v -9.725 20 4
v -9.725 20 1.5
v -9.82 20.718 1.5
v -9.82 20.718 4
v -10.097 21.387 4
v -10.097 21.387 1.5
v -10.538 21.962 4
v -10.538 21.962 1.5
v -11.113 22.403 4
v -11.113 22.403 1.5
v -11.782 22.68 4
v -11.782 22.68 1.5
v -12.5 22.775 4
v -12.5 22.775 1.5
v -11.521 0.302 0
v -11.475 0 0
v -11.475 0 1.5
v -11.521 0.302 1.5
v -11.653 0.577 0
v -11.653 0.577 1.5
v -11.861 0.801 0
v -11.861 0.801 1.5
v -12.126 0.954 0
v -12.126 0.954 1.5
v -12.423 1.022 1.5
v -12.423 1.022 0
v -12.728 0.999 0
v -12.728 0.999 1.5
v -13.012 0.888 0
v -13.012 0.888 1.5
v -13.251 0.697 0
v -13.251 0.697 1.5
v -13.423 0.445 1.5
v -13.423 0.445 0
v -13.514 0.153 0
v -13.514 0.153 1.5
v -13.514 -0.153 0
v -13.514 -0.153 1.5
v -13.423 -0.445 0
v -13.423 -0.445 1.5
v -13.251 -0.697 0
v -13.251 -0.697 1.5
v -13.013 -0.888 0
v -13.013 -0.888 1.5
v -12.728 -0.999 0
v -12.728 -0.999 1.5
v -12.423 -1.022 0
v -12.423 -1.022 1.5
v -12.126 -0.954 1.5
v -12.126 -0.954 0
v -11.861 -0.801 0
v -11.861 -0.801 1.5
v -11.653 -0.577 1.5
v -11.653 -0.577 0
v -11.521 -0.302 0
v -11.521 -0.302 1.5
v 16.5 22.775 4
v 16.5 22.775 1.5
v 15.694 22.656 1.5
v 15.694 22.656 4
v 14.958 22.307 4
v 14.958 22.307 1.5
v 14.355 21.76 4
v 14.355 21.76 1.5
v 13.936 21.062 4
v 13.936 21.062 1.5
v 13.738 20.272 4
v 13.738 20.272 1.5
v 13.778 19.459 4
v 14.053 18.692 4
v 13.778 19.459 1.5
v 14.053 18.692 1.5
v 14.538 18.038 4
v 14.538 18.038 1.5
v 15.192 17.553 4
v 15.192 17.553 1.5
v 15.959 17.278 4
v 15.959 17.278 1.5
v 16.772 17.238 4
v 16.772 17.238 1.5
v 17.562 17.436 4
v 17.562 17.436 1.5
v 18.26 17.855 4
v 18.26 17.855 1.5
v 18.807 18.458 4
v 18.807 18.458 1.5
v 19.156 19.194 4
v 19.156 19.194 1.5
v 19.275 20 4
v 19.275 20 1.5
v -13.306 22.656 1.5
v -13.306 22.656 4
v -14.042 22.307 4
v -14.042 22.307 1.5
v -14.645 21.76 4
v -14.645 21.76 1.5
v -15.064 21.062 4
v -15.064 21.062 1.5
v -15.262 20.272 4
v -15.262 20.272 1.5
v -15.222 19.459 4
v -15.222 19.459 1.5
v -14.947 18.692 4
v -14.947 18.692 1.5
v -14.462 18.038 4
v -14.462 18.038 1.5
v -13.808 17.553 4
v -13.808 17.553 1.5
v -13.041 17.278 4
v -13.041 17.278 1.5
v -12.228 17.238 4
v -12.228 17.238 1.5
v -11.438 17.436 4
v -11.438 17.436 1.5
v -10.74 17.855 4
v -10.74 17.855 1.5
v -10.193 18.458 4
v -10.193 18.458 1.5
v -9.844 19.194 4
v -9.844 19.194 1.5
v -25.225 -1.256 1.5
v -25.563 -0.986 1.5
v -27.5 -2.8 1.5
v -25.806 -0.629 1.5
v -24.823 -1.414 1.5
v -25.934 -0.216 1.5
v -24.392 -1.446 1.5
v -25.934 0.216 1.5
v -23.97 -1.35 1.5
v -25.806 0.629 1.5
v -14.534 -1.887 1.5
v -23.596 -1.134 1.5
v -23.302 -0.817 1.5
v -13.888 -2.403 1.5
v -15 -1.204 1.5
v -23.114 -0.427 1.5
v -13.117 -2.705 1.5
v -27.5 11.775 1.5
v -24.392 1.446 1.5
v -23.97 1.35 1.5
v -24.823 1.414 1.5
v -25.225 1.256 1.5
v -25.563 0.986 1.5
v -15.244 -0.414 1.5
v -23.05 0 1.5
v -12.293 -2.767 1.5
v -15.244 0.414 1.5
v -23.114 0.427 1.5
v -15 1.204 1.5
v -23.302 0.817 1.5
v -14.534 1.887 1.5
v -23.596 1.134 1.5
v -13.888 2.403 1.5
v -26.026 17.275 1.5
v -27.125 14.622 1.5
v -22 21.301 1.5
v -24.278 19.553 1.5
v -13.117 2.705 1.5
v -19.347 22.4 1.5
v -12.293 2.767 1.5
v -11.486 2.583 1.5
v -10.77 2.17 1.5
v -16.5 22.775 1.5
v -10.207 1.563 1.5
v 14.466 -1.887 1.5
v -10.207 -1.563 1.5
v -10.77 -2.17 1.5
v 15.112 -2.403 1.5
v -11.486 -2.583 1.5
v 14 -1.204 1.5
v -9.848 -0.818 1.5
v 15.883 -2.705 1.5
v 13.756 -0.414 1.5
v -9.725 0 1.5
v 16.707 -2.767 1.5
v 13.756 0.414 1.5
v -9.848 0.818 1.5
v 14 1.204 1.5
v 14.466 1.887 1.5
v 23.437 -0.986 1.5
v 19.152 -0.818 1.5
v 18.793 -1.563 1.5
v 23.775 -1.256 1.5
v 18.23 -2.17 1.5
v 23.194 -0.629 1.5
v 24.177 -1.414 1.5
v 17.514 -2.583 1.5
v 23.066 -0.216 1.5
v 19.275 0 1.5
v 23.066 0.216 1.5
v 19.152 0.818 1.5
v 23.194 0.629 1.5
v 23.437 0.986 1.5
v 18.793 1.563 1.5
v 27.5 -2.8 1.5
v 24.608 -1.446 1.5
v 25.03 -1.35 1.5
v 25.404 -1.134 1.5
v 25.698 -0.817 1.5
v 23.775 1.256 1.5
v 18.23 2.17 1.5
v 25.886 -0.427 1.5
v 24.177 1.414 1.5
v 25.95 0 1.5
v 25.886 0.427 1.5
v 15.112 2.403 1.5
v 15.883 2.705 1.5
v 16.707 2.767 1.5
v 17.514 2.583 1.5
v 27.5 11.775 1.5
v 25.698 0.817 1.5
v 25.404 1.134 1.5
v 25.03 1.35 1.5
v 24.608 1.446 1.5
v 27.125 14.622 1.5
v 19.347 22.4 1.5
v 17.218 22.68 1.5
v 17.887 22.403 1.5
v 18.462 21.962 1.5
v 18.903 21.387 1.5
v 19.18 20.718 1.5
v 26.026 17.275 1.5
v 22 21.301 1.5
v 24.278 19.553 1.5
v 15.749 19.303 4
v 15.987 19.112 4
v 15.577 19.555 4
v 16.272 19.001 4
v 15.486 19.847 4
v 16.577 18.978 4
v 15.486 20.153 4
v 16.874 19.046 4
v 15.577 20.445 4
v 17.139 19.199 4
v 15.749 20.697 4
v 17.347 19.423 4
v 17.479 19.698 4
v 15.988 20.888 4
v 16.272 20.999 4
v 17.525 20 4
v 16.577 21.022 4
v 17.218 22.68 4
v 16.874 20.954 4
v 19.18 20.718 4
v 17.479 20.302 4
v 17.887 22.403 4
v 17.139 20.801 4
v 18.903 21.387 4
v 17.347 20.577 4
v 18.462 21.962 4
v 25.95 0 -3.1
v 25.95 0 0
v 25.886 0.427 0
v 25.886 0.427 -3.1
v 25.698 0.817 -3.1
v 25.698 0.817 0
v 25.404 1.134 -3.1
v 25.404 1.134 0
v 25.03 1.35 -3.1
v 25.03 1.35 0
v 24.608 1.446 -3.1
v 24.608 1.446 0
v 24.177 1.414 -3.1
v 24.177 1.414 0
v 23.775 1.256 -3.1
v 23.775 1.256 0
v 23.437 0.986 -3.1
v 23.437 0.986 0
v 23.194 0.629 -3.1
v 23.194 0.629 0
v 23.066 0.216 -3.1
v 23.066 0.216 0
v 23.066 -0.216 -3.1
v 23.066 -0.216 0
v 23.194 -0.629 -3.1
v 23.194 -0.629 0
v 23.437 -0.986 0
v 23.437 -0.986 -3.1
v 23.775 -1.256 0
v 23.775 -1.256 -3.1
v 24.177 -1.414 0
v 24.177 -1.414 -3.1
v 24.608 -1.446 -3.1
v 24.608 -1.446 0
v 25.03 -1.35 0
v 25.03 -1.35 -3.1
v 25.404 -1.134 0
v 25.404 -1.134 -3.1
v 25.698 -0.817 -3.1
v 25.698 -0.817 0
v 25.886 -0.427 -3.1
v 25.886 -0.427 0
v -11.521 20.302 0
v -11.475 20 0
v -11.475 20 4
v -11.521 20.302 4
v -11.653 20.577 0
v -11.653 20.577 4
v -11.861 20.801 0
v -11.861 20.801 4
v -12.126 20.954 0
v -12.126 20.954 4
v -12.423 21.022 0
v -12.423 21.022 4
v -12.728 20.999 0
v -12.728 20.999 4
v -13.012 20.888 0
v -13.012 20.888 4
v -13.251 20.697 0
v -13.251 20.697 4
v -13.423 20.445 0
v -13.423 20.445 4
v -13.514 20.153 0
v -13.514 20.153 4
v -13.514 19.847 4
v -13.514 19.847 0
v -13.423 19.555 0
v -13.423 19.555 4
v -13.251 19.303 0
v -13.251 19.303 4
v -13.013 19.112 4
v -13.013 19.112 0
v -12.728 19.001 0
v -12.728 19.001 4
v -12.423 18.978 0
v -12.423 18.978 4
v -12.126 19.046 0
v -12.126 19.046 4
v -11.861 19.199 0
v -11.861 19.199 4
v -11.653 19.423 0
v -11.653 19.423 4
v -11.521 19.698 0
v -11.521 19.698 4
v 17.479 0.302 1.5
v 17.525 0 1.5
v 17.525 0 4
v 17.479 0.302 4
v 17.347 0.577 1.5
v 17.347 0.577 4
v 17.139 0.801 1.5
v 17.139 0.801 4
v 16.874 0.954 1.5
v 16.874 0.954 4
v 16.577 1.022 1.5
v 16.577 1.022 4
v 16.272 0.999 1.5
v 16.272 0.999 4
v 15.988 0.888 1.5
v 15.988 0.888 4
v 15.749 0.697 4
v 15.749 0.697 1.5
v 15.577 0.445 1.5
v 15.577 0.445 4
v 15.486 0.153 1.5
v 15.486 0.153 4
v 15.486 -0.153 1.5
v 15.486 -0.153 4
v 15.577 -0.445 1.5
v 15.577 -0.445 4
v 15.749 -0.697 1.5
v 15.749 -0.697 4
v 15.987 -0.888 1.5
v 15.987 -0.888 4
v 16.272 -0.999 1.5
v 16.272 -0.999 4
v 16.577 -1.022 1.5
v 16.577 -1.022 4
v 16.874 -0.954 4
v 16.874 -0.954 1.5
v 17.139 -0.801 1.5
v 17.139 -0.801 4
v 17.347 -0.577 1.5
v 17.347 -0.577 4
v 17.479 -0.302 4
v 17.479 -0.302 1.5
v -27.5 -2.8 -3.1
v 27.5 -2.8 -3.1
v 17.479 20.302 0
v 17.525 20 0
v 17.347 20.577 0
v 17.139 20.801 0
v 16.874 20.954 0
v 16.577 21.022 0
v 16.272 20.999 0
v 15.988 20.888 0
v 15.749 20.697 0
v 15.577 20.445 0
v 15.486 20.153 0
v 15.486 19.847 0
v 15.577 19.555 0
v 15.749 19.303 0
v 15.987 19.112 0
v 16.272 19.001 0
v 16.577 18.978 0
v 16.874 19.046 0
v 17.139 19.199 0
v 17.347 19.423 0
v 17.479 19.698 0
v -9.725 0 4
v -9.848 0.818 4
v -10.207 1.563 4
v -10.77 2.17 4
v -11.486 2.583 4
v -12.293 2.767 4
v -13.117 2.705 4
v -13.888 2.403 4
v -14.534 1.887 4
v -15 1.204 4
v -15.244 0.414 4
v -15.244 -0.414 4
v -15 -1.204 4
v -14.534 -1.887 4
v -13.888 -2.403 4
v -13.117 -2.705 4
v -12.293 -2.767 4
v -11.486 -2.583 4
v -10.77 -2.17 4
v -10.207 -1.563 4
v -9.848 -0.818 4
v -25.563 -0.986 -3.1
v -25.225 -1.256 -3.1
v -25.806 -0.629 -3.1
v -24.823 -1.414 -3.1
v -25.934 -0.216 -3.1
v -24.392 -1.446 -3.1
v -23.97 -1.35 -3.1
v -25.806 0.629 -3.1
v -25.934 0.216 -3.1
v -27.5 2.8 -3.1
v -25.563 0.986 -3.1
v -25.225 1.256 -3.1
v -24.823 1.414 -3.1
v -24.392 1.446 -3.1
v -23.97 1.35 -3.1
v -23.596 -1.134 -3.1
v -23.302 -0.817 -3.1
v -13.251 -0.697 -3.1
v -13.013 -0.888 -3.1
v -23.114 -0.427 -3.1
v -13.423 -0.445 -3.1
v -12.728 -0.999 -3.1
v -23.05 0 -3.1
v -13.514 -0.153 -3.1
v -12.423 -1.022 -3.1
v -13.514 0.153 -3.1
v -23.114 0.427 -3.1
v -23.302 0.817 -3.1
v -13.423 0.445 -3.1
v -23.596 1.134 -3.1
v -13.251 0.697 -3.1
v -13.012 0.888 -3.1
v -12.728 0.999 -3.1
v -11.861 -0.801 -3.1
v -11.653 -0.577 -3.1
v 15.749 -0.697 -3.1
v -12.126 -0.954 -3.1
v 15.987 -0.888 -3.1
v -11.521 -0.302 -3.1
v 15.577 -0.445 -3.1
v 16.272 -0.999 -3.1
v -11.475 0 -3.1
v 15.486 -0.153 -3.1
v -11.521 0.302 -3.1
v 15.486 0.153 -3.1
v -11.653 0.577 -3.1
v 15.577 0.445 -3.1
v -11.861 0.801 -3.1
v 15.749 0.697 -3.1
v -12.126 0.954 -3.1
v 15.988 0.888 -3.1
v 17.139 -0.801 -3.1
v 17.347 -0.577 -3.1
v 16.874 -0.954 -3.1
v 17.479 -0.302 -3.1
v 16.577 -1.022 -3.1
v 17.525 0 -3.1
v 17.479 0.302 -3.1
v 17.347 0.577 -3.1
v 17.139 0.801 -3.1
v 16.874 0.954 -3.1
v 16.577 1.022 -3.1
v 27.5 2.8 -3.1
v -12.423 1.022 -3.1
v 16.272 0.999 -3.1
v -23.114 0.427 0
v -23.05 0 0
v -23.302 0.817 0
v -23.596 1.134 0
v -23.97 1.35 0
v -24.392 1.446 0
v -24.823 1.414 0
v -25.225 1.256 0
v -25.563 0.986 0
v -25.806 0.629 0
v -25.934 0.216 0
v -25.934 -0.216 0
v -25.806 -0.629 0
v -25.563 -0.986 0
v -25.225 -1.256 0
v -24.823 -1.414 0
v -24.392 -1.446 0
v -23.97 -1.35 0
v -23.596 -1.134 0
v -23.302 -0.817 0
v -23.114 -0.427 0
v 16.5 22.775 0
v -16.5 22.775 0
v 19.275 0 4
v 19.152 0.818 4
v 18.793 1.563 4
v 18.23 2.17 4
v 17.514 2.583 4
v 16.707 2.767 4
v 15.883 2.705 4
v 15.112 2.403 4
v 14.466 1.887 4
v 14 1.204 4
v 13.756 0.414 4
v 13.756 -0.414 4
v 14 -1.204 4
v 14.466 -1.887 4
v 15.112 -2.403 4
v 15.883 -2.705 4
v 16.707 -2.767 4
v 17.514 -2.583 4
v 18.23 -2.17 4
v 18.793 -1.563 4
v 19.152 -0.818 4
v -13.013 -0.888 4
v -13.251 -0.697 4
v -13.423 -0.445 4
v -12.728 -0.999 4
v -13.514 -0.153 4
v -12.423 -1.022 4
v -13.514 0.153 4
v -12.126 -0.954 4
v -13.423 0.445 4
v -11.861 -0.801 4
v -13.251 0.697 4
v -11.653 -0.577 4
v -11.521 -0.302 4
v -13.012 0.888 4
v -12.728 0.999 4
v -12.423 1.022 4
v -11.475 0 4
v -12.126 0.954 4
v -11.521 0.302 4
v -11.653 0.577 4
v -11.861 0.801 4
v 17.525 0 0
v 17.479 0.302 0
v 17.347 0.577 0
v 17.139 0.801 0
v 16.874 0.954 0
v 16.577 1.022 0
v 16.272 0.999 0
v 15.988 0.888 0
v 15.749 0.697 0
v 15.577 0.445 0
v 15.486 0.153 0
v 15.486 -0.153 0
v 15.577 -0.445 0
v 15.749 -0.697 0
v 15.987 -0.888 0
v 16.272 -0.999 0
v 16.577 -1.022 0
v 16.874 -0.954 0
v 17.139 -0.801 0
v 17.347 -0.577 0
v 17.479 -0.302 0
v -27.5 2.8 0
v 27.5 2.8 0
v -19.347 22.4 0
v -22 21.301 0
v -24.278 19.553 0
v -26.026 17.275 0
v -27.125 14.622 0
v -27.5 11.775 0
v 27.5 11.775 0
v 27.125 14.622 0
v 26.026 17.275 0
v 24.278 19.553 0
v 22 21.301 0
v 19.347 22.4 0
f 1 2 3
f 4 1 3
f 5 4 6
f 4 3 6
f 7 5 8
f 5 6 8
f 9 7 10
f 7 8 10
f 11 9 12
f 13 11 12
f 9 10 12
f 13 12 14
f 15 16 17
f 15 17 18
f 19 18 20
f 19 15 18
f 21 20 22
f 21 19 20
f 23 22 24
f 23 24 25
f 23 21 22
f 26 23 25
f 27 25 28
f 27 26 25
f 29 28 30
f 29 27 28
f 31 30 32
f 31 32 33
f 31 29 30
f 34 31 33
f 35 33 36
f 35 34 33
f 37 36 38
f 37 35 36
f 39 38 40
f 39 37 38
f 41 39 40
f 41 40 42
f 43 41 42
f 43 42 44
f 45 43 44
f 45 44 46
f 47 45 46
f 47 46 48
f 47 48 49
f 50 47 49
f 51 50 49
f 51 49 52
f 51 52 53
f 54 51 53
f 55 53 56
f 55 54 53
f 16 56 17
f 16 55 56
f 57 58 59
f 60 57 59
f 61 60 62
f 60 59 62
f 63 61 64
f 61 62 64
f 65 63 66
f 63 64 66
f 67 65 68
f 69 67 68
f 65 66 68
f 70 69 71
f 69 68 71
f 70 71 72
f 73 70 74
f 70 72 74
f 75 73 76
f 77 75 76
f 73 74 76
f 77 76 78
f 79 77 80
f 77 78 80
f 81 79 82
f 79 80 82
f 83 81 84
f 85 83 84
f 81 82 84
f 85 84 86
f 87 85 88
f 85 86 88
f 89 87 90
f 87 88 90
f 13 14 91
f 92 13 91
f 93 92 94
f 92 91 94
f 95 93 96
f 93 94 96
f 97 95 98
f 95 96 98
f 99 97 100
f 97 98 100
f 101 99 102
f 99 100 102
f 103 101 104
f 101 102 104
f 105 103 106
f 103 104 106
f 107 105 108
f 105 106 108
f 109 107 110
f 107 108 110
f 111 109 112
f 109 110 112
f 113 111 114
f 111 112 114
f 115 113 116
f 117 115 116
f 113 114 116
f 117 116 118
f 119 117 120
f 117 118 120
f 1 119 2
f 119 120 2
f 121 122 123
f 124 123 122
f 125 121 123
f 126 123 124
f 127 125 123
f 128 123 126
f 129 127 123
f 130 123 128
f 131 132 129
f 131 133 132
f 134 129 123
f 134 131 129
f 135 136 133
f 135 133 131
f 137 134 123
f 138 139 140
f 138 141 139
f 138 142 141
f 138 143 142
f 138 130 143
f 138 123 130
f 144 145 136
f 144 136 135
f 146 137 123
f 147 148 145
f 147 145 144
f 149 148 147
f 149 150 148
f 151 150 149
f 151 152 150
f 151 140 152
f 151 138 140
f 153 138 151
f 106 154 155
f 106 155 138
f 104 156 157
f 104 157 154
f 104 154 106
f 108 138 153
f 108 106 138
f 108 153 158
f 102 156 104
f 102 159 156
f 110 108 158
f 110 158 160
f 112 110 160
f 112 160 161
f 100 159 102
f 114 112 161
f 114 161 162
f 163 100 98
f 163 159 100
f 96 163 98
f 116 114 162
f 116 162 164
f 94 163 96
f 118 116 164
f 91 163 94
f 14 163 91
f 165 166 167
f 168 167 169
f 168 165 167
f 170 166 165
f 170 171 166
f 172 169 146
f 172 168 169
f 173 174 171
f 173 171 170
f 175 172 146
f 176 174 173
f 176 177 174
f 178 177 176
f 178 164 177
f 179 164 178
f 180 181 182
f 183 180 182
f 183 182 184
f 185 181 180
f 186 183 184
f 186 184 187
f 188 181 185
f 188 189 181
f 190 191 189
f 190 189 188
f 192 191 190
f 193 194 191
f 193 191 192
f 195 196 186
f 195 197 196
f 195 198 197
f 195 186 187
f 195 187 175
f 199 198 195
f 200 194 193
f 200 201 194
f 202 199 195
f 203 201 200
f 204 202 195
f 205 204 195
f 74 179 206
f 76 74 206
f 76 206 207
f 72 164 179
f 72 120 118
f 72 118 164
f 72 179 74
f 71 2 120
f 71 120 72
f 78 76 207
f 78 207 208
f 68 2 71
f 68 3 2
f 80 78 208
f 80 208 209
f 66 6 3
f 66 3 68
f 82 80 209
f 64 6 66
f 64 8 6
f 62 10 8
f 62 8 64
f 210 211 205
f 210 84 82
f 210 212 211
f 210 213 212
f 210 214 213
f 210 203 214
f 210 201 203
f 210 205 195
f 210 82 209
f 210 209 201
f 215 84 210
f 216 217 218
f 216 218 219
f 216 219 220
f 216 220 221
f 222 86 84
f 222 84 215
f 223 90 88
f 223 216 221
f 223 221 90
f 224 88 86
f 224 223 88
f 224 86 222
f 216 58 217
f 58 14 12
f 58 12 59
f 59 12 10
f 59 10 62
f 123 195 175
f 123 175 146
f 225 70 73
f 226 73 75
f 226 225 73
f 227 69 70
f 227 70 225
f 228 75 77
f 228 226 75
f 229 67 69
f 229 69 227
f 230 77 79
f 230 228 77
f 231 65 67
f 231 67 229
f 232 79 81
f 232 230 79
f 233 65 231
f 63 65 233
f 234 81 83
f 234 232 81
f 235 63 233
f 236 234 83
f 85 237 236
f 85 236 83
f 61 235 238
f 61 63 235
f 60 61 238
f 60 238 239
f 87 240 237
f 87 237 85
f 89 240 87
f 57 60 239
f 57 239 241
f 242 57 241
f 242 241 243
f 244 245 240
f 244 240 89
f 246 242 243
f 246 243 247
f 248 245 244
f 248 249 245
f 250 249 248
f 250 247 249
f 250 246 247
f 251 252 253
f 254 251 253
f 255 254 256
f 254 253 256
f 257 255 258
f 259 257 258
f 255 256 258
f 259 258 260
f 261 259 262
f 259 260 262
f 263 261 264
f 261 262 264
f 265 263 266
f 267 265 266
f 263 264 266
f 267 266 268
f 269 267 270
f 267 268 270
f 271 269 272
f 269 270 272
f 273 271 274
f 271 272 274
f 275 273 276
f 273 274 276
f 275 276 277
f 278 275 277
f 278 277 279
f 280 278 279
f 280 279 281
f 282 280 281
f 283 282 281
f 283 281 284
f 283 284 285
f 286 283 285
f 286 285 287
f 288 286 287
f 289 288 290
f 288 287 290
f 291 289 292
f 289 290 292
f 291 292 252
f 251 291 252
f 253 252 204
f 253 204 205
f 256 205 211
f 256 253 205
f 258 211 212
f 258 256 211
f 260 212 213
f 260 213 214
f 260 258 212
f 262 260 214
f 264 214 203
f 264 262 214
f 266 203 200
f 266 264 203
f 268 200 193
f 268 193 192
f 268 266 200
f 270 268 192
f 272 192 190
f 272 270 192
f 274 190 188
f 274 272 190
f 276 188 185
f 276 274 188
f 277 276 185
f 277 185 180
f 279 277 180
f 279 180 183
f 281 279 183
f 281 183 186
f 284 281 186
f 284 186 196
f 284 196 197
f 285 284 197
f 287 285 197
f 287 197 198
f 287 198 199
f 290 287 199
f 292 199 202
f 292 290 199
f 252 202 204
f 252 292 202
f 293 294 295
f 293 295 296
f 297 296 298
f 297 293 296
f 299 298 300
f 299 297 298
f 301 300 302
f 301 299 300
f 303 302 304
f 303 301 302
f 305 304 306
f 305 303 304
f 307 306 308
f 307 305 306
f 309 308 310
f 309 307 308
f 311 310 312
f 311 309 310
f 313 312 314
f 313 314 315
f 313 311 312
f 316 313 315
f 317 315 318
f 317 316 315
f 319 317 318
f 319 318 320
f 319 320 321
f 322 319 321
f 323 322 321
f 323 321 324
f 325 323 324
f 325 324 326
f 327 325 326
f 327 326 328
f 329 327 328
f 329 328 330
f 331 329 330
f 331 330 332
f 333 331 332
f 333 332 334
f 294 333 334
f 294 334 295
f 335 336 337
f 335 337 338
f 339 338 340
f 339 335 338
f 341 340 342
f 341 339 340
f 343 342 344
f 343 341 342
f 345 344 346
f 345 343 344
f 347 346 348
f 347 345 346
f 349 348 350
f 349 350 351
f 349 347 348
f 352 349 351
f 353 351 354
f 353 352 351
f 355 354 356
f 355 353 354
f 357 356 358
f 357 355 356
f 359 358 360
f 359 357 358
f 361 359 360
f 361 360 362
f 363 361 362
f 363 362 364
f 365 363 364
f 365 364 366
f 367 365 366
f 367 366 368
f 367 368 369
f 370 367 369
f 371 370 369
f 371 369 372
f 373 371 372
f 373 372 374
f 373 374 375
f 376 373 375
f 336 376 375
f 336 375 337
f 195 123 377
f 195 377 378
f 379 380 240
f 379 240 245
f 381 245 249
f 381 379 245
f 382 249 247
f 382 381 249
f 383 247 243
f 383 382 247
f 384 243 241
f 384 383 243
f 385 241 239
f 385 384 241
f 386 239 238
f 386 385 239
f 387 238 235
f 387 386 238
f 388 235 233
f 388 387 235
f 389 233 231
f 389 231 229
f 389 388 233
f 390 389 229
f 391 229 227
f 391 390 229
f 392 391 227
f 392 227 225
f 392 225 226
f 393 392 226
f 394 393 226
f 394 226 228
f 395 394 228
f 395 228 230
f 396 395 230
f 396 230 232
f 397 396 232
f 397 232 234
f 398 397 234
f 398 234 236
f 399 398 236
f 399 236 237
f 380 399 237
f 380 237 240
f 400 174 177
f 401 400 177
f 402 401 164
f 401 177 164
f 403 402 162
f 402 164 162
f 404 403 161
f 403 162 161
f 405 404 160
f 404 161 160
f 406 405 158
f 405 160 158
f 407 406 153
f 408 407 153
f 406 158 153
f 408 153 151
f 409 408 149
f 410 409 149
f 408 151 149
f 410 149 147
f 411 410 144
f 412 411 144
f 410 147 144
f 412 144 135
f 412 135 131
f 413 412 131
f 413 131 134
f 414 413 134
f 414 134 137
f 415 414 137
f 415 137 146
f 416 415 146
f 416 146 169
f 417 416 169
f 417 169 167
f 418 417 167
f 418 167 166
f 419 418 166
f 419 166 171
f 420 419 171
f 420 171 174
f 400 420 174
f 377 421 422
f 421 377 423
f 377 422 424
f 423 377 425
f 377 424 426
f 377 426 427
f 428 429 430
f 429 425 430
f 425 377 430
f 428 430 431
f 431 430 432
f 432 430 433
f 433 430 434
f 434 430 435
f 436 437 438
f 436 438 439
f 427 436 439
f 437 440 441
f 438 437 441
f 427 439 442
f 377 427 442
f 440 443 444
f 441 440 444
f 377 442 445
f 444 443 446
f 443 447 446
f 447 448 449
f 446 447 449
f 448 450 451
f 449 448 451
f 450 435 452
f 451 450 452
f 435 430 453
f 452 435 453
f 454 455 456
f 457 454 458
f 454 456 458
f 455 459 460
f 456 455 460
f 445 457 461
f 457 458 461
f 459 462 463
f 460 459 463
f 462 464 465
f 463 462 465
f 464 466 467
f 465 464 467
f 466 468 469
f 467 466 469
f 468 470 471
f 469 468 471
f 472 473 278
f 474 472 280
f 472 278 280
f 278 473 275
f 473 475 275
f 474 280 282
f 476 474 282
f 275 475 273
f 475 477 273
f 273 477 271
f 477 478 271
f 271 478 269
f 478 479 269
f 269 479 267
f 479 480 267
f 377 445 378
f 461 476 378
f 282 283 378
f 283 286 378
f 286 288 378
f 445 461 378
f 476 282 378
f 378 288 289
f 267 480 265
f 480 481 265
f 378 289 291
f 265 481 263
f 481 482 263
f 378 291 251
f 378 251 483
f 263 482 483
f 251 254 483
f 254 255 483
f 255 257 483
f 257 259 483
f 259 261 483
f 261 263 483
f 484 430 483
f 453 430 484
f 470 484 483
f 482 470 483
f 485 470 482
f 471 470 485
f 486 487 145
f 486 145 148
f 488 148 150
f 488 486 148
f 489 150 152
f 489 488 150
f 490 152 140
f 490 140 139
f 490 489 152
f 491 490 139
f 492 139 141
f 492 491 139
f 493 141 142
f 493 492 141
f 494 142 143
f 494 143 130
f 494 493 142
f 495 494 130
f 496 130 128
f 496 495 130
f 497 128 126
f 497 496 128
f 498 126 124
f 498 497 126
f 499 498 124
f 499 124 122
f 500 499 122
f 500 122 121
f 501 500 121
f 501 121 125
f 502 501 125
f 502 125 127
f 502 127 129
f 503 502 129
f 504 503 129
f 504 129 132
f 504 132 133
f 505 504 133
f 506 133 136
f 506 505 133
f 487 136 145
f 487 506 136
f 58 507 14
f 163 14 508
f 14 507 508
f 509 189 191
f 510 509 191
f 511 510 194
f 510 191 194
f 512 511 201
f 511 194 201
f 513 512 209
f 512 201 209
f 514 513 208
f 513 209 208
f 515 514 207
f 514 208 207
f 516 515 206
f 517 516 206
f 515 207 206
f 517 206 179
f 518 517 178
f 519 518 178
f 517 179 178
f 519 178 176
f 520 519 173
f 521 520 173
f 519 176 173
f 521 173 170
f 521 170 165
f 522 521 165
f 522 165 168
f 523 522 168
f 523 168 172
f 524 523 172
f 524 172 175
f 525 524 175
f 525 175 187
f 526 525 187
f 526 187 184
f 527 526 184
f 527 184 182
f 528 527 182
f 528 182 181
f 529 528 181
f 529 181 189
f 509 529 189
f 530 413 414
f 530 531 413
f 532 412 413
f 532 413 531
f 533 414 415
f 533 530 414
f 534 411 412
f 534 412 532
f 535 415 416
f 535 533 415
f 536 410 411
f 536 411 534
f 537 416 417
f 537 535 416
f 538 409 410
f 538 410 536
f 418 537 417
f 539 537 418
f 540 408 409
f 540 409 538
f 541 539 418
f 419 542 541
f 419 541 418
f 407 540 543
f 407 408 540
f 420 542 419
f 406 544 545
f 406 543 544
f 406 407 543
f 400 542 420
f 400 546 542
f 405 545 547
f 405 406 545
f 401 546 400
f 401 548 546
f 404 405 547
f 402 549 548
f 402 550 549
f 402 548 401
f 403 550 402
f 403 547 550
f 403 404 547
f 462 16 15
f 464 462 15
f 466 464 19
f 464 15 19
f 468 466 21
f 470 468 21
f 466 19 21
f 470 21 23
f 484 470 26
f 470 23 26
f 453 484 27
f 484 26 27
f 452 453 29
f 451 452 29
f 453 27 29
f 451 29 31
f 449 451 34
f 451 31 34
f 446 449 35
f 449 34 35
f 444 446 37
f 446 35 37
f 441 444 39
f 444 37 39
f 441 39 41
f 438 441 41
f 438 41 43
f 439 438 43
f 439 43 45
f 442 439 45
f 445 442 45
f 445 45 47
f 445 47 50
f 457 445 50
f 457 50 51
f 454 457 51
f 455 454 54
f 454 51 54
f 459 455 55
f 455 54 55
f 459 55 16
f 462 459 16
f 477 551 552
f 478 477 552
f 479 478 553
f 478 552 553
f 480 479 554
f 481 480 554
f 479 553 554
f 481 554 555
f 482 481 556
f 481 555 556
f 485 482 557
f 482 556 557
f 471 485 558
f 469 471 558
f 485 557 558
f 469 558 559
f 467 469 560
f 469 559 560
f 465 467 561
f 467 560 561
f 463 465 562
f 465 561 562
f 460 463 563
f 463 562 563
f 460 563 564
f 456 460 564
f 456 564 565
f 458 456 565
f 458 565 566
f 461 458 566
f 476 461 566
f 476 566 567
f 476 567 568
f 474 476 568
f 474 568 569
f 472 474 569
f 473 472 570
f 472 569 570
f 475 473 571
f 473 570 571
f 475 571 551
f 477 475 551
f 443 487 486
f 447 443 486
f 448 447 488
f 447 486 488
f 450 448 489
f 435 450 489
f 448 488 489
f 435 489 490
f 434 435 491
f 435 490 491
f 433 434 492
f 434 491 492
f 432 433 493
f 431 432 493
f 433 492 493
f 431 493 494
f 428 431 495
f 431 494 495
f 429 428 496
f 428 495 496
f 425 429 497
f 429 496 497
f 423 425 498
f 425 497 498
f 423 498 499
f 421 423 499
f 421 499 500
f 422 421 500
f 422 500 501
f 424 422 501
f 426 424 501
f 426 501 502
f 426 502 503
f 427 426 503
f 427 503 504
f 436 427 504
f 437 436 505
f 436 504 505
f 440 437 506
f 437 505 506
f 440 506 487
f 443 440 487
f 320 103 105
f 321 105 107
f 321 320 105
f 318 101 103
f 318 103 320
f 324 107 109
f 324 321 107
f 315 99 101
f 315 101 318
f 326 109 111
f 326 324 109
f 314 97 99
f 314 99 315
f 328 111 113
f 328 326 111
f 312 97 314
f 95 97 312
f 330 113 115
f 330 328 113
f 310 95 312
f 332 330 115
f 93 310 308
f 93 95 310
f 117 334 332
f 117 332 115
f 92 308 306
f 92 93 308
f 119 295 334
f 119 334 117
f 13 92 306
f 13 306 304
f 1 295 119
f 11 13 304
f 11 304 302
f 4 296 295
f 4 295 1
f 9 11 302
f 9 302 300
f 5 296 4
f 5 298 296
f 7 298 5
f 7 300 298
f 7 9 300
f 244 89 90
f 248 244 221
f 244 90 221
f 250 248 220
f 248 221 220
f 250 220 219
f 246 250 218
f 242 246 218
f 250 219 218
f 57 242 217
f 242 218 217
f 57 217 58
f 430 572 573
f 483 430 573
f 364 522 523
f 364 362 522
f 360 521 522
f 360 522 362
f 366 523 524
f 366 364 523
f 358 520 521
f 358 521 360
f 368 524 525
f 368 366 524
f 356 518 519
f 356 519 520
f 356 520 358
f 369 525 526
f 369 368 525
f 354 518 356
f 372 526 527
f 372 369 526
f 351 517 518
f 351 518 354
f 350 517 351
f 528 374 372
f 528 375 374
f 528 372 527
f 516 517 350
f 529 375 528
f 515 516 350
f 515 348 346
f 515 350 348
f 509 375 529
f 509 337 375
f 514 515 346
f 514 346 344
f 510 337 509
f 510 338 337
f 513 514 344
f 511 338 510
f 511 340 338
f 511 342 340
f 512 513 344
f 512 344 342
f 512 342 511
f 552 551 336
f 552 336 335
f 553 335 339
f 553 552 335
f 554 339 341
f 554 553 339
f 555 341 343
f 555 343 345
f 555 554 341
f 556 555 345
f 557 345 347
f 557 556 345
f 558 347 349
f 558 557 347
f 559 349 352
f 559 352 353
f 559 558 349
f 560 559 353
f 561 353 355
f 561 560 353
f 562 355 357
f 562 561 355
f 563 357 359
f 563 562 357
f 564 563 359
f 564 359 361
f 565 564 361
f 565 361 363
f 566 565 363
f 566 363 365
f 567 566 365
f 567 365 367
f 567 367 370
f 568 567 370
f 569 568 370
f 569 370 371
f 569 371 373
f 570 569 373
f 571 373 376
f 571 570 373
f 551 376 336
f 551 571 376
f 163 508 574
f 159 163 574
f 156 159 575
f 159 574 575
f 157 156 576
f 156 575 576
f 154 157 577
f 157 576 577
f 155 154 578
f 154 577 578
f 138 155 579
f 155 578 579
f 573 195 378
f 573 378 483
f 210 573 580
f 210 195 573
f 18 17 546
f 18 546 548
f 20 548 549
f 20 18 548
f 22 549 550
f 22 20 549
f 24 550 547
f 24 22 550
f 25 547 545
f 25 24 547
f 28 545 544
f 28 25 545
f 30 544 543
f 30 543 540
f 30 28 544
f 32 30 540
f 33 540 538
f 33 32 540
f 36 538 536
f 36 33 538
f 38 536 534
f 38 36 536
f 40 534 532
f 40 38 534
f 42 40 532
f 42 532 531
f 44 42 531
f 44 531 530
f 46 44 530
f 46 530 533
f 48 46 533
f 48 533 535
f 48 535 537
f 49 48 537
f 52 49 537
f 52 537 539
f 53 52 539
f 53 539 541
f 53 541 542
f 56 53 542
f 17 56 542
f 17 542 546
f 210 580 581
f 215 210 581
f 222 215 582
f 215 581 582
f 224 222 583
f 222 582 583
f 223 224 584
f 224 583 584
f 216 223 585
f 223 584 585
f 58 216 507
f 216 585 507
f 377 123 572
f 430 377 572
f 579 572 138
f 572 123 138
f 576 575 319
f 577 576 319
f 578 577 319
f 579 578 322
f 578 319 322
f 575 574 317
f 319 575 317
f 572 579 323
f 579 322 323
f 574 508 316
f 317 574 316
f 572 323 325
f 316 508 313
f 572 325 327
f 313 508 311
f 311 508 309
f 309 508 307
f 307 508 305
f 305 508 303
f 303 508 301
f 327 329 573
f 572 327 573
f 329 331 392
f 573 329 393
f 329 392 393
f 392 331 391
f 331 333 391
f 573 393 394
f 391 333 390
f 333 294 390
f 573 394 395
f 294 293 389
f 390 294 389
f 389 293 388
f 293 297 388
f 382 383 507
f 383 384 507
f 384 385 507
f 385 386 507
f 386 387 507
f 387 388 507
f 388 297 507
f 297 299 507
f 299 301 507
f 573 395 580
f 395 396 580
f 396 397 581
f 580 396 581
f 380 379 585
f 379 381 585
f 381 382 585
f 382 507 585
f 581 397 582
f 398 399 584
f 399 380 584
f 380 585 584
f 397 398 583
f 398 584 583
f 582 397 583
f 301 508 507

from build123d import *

# Parameters (mm, degrees)
F0_W     = 55
F0_H     = 5.6
F0_R     = 1.45
F0_R_2   = 2.775
F0_R_3   = 1.025
F1_DEPTH = 1.5
F2_DEPTH = 3.1
F3_DEPTH = 4


with BuildPart() as f1:
    # F0 (on Top) → F1 (new body)
    with BuildSketch(Plane.XY):
        Rectangle(F0_W, F0_H)
        with Locations((-24.5, 0)):
            Circle(F0_R, mode=Mode.SUBTRACT)
        with Locations((-12.5, 0)):
            Circle(F0_R_2, mode=Mode.SUBTRACT)
        with Locations((16.5, 0)):
            Circle(F0_R_2, mode=Mode.SUBTRACT)
        with Locations((24.5, 0)):
            Circle(F0_R, mode=Mode.SUBTRACT)
        with BuildLine():
            Line((-27.5, 11.775), (-27.5, 2.8))
            Line((-27.5, 2.8), (27.5, 2.8))
            Line((27.5, 2.8), (27.5, 11.775))
            ThreePointArc((27.5, 11.775), (24.278175, 19.553175), (16.5, 22.775))
            Line((16.5, 22.775), (-12.5, 22.775))
            Line((-12.5, 22.775), (-16.5, 22.775))
            ThreePointArc((-16.5, 22.775), (-24.278175, 19.553175), (-27.5, 11.775))
        make_face()
        with BuildLine():
            ThreePointArc((-9.725, 20), (-14.462221, 18.037779), (-12.5, 22.775))
            ThreePointArc((-12.5, 22.775), (-10.537779, 21.962221), (-9.725, 20))
        make_face(mode=Mode.SUBTRACT)
        with BuildLine():
            ThreePointArc((19.275, 20), (14.537779, 18.037779), (16.5, 22.775))
            ThreePointArc((16.5, 22.775), (18.462221, 21.962221), (19.275, 20))
        make_face(mode=Mode.SUBTRACT)
        with BuildLine():
            ThreePointArc((19.275, 20), (18.462221, 21.962221), (16.5, 22.775))
            ThreePointArc((16.5, 22.775), (14.537779, 18.037779), (19.275, 20))
        make_face()
        with Locations((16.5, 20)):
            Circle(F0_R_3, mode=Mode.SUBTRACT)
        with BuildLine():
            ThreePointArc((-9.725, 20), (-10.537779, 21.962221), (-12.5, 22.775))
            ThreePointArc((-12.5, 22.775), (-14.462221, 18.037779), (-9.725, 20))
        make_face()
        with Locations((-12.5, 20)):
            Circle(F0_R_3, mode=Mode.SUBTRACT)
        with Locations((16.5, 0)):
            Circle(F0_R_2)
        with Locations((16.5, 0)):
            Circle(F0_R_3, mode=Mode.SUBTRACT)
        with Locations((-12.5, 0)):
            Circle(F0_R_2)
        with Locations((-12.5, 0)):
            Circle(F0_R_3, mode=Mode.SUBTRACT)
    extrude(amount=F1_DEPTH)

    # F0 (on Top) → F2 (join)
    with BuildSketch(Plane.XY):
        Rectangle(F0_W, F0_H)
        with Locations((-24.5, 0)):
            Circle(F0_R, mode=Mode.SUBTRACT)
        with Locations((-12.5, 0)):
            Circle(F0_R_2, mode=Mode.SUBTRACT)
        with Locations((16.5, 0)):
            Circle(F0_R_2, mode=Mode.SUBTRACT)
        with Locations((24.5, 0)):
            Circle(F0_R, mode=Mode.SUBTRACT)
        with Locations((-12.5, 0)):
            Circle(F0_R_2)
        with Locations((-12.5, 0)):
            Circle(F0_R_3, mode=Mode.SUBTRACT)
        with Locations((16.5, 0)):
            Circle(F0_R_2)
        with Locations((16.5, 0)):
            Circle(F0_R_3, mode=Mode.SUBTRACT)
    extrude(amount=-F2_DEPTH)

    # F0 (on Top) → F3 (join)
    with BuildSketch(Plane.XY):
        with BuildLine():
            ThreePointArc((19.275, 20), (18.462221, 21.962221), (16.5, 22.775))
            ThreePointArc((16.5, 22.775), (14.537779, 18.037779), (19.275, 20))
        make_face()
        with Locations((16.5, 20)):
            Circle(F0_R_3, mode=Mode.SUBTRACT)
        with BuildLine():
            ThreePointArc((-9.725, 20), (-10.537779, 21.962221), (-12.5, 22.775))
            ThreePointArc((-12.5, 22.775), (-14.462221, 18.037779), (-9.725, 20))
        make_face()
        with Locations((-12.5, 20)):
            Circle(F0_R_3, mode=Mode.SUBTRACT)
        with Locations((16.5, 0)):
            Circle(F0_R_2)
        with Locations((16.5, 0)):
            Circle(F0_R_3, mode=Mode.SUBTRACT)
        with Locations((-12.5, 0)):
            Circle(F0_R_2)
        with Locations((-12.5, 0)):
            Circle(F0_R_3, mode=Mode.SUBTRACT)
    extrude(amount=F3_DEPTH)


solid = f1.part
